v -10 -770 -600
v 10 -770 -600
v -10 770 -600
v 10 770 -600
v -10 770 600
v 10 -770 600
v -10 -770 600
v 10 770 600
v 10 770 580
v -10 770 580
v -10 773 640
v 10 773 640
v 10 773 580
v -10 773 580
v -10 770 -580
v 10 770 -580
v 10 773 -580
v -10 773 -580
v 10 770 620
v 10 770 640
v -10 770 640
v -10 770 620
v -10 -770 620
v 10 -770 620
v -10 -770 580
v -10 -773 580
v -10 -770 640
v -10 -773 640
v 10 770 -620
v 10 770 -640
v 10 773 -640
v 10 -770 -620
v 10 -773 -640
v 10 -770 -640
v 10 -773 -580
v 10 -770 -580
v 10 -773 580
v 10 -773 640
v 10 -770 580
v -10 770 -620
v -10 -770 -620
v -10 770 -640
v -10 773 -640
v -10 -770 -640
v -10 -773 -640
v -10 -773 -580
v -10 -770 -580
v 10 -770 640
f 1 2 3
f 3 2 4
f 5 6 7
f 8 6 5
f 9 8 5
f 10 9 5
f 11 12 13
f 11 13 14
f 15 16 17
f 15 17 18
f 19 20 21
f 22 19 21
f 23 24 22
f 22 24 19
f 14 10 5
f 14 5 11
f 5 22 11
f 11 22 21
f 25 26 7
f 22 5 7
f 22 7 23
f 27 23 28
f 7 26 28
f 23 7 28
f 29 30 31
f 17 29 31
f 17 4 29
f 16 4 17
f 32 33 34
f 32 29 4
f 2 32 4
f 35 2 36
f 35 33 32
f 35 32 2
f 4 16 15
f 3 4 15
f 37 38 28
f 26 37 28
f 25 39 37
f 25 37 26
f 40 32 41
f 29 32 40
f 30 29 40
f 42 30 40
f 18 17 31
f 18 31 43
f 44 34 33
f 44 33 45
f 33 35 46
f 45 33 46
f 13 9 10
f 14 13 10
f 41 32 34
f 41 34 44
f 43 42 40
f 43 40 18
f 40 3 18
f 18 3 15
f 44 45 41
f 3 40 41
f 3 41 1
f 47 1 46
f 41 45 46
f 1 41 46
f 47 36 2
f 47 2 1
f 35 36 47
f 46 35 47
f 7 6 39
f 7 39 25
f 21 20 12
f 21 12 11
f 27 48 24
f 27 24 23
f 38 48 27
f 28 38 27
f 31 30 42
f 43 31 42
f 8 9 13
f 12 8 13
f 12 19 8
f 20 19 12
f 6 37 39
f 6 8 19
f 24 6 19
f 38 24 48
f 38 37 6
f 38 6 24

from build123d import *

# Parameters (mm, degrees)
SKETCH022_W      = 20
SKETCH022_H      = 60
EXTRUDE023_DEPTH = 3
SKETCH021_W      = 2000
SKETCH021_H      = 1200
EXTRUDE022_DEPTH = 15
SKETCH020_W      = 1540
SKETCH020_H      = 1240
SKETCH020_W_2    = 1500
SKETCH020_H_2    = 1200
EXTRUDE021_DEPTH = 10


with BuildPart() as extrude023:
    # Sketch022 → Extrude023 (new body)
    with BuildSketch(Plane(origin=(0, 770, 610), x_dir=(-1, 0, 0), z_dir=(0, 1, 0))):
        Rectangle(SKETCH022_W, SKETCH022_H)
        with Locations((0, -1220)):
            Rectangle(SKETCH022_W, SKETCH022_H)
    extrude(amount=EXTRUDE023_DEPTH)


with BuildPart() as extrude022:
    # Sketch021 → Extrude022 (new body, symmetric)
    with BuildSketch(Plane.YZ):
        Rectangle(SKETCH021_W, SKETCH021_H)
    extrude(amount=EXTRUDE022_DEPTH, both=True)


with BuildPart() as cut008:
    # Sketch020 → Extrude021 (new body, symmetric)
    with BuildSketch(Plane.YZ):
        Rectangle(SKETCH020_W, SKETCH020_H)
        Rectangle(SKETCH020_W_2, SKETCH020_H_2, mode=Mode.SUBTRACT)
    extrude(amount=EXTRUDE021_DEPTH, both=True)

    # Cut008: cut Extrude022
    add(extrude022.part, mode=Mode.SUBTRACT)


with BuildPart() as fusion001:
    # Part__Mirroring001: instance of Extrude023
    add(extrude023.part.mirror(Plane(origin=(0, 0, 0), x_dir=(1, 0, 0), z_dir=(0, 1, 0))))

    # Fusion001: union Extrude023, Cut008
    add(extrude023.part)
    add(cut008.part)


solid = fusion001.part
